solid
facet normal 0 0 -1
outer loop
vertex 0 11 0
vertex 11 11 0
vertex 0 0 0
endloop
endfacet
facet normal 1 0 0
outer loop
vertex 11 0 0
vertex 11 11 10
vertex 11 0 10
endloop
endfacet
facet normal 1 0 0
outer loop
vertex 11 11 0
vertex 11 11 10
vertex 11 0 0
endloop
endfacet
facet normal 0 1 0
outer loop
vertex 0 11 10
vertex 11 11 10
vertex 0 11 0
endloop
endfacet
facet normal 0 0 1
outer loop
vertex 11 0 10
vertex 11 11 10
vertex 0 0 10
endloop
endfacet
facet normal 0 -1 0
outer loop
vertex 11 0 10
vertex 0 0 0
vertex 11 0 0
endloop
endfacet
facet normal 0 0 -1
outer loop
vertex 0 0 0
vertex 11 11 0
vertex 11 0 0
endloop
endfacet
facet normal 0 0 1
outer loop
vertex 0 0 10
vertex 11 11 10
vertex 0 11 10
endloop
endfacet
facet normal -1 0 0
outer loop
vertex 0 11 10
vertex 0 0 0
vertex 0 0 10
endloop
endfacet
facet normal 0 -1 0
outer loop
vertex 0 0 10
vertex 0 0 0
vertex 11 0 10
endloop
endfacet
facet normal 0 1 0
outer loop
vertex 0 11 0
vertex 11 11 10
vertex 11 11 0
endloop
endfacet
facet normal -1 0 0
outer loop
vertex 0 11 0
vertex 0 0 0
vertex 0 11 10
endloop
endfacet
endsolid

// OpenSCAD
input_length = 10;
input_height = 10;
input_depth = 10;

box_size = 1;
length = input_length;
height = input_height - box_size;
depth = input_depth;

bottom_back_left =   [0,      0,     0];
top_back_left =      [0,      0,     height];
bottom_front_left =  [0,      depth, 0];
top_front_left =     [0,      depth, height];
bottom_back_right =  [length, 0,     0];
top_back_right =     [length, 0,     height];
bottom_front_right = [length, depth, 0];
top_front_right =    [length, depth, height];

box = [bottom_back_left, top_back_left, bottom_front_left, top_front_left, bottom_back_right, top_back_right, bottom_front_right, top_front_right];

hull(){
	for(position = box){
		translate(position){
			cube(box_size);
		}
	}
}
